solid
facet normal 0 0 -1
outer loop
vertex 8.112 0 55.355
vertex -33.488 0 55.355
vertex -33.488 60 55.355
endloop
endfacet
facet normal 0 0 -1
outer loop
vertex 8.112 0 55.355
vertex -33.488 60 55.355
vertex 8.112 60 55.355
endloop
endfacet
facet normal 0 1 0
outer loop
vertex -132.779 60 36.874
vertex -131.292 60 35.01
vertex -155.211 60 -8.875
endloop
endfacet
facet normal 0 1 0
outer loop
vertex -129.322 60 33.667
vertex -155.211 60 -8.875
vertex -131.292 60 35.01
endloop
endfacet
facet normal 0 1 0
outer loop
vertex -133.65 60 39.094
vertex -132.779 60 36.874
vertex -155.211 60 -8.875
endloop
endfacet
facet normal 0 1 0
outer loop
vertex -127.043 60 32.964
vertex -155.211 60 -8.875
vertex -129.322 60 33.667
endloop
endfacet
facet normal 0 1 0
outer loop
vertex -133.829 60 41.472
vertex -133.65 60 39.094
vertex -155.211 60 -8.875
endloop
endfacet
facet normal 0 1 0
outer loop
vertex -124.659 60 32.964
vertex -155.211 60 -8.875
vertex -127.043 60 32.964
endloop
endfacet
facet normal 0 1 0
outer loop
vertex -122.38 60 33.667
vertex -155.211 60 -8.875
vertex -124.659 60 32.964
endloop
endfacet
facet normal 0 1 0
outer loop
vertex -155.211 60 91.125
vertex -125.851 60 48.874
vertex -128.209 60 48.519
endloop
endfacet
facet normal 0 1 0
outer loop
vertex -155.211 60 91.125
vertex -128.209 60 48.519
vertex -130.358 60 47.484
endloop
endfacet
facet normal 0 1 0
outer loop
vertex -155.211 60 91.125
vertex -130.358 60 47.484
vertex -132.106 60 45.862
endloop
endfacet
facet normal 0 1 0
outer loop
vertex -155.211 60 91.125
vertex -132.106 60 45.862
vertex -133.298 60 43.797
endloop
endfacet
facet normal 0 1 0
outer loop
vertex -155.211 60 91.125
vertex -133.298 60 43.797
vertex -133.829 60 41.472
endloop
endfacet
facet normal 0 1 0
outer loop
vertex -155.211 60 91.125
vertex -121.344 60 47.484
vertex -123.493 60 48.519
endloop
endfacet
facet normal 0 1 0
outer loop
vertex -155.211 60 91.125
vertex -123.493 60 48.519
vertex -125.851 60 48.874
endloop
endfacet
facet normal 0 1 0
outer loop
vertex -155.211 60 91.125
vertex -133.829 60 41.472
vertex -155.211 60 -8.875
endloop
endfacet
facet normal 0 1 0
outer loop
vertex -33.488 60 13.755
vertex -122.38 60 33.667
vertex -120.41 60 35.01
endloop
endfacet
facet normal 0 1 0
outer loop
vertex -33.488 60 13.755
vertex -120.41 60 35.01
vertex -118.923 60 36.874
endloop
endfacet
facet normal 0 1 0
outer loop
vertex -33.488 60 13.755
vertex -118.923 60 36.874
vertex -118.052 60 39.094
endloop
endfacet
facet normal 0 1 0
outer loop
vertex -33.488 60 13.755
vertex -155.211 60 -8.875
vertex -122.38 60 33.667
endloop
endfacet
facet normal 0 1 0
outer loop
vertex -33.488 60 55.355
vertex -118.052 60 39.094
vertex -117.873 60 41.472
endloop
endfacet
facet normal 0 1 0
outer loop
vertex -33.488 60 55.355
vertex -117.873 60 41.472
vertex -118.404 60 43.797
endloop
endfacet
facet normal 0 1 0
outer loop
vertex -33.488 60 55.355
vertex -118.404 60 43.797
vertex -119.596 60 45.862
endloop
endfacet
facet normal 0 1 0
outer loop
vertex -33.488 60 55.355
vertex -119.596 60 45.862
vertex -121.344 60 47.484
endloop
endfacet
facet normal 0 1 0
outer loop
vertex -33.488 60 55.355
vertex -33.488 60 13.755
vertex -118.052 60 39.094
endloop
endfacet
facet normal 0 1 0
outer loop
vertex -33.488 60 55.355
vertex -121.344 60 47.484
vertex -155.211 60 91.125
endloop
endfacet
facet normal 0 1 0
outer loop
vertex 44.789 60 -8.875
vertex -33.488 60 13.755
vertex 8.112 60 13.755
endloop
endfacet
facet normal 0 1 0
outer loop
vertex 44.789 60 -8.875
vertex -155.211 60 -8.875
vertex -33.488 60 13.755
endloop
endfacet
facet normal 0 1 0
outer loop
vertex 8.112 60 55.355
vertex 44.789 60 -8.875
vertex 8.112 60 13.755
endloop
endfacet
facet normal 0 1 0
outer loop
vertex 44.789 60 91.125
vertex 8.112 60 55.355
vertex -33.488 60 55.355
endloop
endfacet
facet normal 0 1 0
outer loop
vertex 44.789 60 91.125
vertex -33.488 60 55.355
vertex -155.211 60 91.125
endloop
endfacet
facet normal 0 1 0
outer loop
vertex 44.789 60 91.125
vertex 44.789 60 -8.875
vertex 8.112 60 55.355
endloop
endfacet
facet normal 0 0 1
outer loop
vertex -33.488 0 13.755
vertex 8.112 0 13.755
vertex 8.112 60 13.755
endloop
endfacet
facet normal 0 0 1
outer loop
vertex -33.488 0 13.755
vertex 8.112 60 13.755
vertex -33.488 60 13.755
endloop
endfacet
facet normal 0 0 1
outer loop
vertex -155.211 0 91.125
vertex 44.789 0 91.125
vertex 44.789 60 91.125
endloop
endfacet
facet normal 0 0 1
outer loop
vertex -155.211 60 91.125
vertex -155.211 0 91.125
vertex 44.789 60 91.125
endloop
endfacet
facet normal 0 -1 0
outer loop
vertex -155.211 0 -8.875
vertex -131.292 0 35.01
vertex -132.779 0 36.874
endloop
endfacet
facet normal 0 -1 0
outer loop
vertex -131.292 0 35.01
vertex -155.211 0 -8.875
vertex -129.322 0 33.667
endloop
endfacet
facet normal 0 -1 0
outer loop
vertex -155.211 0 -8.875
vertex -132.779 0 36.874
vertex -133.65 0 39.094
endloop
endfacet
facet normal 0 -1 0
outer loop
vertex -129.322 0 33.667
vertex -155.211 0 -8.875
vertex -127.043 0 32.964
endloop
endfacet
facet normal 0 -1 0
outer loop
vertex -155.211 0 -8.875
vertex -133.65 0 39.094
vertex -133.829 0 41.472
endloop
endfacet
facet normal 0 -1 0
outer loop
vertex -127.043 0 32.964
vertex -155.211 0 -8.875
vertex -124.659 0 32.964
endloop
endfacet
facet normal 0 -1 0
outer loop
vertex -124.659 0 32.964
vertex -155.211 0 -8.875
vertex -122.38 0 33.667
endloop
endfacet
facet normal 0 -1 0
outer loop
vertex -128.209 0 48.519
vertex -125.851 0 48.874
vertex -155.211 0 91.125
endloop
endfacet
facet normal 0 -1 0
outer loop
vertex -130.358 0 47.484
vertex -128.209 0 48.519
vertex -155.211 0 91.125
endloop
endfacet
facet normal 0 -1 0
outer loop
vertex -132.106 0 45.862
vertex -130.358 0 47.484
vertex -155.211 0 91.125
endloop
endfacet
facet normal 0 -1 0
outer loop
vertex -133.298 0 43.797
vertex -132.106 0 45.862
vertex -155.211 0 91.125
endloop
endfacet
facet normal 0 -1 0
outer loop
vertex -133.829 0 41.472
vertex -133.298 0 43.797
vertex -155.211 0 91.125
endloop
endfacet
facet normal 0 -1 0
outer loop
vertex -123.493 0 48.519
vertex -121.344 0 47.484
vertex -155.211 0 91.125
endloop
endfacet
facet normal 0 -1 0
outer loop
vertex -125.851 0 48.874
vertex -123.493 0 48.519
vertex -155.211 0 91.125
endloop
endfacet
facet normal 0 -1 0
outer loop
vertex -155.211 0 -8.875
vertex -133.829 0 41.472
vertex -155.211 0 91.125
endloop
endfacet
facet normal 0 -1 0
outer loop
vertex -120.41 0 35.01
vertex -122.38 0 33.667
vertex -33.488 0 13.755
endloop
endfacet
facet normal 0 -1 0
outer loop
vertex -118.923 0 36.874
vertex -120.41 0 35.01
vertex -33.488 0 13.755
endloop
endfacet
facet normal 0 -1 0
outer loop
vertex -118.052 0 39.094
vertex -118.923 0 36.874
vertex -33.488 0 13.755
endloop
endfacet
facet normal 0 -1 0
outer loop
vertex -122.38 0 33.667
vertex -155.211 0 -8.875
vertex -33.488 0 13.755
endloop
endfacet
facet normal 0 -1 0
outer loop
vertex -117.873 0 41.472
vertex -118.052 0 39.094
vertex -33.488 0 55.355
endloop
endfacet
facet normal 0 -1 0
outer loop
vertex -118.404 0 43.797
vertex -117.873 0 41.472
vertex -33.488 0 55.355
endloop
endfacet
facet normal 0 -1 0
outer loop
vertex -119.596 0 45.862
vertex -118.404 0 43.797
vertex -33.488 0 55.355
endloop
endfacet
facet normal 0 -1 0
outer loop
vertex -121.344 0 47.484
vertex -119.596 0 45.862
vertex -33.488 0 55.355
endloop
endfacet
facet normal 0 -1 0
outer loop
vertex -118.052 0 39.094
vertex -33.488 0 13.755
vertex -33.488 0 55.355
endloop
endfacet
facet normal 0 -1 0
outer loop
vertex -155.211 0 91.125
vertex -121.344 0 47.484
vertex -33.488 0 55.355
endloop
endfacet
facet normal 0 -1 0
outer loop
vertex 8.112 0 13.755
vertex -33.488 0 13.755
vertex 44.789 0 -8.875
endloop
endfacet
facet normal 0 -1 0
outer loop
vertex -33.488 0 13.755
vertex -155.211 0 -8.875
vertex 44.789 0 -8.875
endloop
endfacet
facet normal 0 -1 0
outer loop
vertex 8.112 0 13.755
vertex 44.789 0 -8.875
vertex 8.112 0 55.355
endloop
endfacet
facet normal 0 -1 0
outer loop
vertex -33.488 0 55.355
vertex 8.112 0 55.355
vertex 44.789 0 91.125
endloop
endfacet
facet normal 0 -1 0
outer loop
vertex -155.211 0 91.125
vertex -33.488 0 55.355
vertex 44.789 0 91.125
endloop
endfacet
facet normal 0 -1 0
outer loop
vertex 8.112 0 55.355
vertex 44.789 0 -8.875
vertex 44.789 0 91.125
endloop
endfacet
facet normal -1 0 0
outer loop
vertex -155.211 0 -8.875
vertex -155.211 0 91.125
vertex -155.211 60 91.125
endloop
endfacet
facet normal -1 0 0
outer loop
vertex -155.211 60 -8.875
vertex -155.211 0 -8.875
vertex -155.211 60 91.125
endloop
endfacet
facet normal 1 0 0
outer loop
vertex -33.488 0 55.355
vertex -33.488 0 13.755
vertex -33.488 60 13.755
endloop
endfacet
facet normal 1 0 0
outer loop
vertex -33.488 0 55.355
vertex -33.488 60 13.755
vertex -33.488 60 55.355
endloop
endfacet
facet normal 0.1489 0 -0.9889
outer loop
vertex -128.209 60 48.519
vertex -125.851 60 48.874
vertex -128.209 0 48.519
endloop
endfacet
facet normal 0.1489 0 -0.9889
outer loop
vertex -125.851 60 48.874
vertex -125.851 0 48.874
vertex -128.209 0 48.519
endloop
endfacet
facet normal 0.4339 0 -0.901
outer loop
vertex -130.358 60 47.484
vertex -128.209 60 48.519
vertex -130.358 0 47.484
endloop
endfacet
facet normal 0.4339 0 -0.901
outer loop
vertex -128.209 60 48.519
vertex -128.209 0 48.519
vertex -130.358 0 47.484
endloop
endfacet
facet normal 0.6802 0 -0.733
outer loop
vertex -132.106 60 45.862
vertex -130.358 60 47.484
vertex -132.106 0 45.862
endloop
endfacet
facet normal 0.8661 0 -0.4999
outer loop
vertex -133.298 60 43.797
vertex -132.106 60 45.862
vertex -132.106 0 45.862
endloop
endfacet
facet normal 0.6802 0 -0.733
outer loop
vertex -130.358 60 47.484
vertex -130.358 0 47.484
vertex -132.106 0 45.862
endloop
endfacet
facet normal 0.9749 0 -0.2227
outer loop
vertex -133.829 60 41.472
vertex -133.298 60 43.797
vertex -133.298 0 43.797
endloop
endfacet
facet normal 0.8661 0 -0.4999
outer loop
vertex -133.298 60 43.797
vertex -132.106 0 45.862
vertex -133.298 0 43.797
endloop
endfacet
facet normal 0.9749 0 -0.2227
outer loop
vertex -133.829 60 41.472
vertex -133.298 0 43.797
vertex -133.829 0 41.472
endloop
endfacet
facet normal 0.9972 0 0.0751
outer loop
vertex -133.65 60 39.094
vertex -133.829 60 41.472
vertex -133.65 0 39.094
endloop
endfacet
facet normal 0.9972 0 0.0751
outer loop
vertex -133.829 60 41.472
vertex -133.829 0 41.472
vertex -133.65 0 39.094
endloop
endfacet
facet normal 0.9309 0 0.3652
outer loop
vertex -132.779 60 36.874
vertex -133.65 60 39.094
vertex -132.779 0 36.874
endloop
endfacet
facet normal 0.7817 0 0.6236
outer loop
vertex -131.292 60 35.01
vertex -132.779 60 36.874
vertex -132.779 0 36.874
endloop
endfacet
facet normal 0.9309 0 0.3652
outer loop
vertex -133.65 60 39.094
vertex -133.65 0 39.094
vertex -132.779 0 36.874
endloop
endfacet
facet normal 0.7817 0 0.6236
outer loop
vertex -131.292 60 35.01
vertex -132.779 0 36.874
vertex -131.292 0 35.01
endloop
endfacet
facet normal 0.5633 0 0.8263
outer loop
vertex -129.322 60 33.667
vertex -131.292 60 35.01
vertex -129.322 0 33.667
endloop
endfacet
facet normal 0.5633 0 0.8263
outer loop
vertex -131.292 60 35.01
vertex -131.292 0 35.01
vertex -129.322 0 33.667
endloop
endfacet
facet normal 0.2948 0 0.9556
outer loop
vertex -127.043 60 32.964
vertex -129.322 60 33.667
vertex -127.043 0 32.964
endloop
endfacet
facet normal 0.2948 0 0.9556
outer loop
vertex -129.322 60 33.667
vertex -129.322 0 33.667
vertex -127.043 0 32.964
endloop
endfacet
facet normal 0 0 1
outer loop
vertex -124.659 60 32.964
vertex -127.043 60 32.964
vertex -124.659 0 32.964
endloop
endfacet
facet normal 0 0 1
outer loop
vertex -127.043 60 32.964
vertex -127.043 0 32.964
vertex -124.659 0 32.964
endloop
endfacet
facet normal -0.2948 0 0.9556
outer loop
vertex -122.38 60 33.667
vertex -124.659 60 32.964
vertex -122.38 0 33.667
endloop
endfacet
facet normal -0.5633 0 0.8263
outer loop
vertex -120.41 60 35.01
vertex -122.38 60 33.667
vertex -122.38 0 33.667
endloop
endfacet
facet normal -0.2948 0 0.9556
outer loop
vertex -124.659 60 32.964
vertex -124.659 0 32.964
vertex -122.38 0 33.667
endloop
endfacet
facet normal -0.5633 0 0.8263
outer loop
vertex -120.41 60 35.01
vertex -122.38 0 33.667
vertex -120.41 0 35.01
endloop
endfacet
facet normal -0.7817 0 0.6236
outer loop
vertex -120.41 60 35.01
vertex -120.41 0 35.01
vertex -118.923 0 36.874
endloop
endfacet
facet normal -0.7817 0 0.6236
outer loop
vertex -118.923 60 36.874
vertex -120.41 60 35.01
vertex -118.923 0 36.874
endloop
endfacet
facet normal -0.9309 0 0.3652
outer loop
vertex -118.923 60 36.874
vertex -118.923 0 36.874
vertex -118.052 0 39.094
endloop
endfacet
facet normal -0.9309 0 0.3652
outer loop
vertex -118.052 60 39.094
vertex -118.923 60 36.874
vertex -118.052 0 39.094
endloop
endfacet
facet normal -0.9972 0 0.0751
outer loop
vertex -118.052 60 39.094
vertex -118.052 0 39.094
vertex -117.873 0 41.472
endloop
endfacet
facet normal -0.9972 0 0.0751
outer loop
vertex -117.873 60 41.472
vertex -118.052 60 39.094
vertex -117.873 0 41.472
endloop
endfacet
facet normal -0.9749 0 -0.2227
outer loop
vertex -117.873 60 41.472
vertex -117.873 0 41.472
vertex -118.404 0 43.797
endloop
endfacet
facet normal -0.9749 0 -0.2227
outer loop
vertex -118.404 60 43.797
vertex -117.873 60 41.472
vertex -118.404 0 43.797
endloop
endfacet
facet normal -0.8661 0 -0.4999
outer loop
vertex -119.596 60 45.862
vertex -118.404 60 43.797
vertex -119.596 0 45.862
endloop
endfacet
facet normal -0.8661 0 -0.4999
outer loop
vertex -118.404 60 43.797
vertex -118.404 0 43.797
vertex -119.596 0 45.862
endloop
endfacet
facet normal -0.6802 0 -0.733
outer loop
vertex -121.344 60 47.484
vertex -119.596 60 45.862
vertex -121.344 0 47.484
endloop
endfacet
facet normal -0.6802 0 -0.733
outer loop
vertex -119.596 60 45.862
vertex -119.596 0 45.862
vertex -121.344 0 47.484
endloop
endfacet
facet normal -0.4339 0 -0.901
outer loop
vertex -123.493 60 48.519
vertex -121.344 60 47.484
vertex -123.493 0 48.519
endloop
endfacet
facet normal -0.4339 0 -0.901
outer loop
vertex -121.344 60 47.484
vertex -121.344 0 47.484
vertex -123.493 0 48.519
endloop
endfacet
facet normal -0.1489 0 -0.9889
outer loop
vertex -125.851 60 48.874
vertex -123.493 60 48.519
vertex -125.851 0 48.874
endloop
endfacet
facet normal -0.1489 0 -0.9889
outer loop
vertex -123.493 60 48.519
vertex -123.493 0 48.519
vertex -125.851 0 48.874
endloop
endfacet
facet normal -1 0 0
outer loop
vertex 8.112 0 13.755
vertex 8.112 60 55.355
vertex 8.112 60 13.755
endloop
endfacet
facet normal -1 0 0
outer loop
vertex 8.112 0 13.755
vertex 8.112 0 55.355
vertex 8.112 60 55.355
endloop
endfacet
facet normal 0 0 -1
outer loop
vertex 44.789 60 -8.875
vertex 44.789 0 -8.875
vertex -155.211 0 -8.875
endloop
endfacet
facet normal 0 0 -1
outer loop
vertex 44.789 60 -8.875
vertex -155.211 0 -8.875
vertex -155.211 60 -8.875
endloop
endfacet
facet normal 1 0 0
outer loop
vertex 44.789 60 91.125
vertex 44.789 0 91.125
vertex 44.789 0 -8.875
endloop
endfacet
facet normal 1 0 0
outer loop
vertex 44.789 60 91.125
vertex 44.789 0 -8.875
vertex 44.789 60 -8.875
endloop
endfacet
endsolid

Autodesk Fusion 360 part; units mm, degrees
box "BoxPrimitive1" add length 100 width 200 height 60 placed x (0, 0, 1) y (1, 0, 0) z (0, 1, 0) at (-155.2109, 0, -8.8747)
hole "Hole1" at (-125.851, 60, 40.8743) direction (0, -1, 0) diameter 16 depth 100 tip angle 118
sketch "Sketch7" plane through (0, 0, 0) normal (0, -1, 0) x (1, 0, 0)
  circle A0 centre (-125.851, 40.8743) radius 8
  line L0 (44.7891, 91.1253) -> (-155.2109, 91.1253)
  line L1 (-155.2109, 91.1253) -> (-155.2109, -8.8747)
  line L2 (-155.2109, -8.8747) -> (44.7891, -8.8747)
  line L3 (44.7891, -8.8747) -> (44.7891, 91.1253)
  line L4 (-33.4877, 55.3548) -> (8.1123, 55.3548)
  line L5 (8.1123, 55.3548) -> (8.1123, 13.7548)
  line L6 (8.1123, 13.7548) -> (-33.4877, 13.7548)
  line L7 (-33.4877, 13.7548) -> (-33.4877, 55.3548)
  dimension "d9" = 41.6
  dimension "d10" = 41.6
extrude "Extrude1" cut sketch "Sketch7" against normal blind 60 contours L4 L5 L6 L7
